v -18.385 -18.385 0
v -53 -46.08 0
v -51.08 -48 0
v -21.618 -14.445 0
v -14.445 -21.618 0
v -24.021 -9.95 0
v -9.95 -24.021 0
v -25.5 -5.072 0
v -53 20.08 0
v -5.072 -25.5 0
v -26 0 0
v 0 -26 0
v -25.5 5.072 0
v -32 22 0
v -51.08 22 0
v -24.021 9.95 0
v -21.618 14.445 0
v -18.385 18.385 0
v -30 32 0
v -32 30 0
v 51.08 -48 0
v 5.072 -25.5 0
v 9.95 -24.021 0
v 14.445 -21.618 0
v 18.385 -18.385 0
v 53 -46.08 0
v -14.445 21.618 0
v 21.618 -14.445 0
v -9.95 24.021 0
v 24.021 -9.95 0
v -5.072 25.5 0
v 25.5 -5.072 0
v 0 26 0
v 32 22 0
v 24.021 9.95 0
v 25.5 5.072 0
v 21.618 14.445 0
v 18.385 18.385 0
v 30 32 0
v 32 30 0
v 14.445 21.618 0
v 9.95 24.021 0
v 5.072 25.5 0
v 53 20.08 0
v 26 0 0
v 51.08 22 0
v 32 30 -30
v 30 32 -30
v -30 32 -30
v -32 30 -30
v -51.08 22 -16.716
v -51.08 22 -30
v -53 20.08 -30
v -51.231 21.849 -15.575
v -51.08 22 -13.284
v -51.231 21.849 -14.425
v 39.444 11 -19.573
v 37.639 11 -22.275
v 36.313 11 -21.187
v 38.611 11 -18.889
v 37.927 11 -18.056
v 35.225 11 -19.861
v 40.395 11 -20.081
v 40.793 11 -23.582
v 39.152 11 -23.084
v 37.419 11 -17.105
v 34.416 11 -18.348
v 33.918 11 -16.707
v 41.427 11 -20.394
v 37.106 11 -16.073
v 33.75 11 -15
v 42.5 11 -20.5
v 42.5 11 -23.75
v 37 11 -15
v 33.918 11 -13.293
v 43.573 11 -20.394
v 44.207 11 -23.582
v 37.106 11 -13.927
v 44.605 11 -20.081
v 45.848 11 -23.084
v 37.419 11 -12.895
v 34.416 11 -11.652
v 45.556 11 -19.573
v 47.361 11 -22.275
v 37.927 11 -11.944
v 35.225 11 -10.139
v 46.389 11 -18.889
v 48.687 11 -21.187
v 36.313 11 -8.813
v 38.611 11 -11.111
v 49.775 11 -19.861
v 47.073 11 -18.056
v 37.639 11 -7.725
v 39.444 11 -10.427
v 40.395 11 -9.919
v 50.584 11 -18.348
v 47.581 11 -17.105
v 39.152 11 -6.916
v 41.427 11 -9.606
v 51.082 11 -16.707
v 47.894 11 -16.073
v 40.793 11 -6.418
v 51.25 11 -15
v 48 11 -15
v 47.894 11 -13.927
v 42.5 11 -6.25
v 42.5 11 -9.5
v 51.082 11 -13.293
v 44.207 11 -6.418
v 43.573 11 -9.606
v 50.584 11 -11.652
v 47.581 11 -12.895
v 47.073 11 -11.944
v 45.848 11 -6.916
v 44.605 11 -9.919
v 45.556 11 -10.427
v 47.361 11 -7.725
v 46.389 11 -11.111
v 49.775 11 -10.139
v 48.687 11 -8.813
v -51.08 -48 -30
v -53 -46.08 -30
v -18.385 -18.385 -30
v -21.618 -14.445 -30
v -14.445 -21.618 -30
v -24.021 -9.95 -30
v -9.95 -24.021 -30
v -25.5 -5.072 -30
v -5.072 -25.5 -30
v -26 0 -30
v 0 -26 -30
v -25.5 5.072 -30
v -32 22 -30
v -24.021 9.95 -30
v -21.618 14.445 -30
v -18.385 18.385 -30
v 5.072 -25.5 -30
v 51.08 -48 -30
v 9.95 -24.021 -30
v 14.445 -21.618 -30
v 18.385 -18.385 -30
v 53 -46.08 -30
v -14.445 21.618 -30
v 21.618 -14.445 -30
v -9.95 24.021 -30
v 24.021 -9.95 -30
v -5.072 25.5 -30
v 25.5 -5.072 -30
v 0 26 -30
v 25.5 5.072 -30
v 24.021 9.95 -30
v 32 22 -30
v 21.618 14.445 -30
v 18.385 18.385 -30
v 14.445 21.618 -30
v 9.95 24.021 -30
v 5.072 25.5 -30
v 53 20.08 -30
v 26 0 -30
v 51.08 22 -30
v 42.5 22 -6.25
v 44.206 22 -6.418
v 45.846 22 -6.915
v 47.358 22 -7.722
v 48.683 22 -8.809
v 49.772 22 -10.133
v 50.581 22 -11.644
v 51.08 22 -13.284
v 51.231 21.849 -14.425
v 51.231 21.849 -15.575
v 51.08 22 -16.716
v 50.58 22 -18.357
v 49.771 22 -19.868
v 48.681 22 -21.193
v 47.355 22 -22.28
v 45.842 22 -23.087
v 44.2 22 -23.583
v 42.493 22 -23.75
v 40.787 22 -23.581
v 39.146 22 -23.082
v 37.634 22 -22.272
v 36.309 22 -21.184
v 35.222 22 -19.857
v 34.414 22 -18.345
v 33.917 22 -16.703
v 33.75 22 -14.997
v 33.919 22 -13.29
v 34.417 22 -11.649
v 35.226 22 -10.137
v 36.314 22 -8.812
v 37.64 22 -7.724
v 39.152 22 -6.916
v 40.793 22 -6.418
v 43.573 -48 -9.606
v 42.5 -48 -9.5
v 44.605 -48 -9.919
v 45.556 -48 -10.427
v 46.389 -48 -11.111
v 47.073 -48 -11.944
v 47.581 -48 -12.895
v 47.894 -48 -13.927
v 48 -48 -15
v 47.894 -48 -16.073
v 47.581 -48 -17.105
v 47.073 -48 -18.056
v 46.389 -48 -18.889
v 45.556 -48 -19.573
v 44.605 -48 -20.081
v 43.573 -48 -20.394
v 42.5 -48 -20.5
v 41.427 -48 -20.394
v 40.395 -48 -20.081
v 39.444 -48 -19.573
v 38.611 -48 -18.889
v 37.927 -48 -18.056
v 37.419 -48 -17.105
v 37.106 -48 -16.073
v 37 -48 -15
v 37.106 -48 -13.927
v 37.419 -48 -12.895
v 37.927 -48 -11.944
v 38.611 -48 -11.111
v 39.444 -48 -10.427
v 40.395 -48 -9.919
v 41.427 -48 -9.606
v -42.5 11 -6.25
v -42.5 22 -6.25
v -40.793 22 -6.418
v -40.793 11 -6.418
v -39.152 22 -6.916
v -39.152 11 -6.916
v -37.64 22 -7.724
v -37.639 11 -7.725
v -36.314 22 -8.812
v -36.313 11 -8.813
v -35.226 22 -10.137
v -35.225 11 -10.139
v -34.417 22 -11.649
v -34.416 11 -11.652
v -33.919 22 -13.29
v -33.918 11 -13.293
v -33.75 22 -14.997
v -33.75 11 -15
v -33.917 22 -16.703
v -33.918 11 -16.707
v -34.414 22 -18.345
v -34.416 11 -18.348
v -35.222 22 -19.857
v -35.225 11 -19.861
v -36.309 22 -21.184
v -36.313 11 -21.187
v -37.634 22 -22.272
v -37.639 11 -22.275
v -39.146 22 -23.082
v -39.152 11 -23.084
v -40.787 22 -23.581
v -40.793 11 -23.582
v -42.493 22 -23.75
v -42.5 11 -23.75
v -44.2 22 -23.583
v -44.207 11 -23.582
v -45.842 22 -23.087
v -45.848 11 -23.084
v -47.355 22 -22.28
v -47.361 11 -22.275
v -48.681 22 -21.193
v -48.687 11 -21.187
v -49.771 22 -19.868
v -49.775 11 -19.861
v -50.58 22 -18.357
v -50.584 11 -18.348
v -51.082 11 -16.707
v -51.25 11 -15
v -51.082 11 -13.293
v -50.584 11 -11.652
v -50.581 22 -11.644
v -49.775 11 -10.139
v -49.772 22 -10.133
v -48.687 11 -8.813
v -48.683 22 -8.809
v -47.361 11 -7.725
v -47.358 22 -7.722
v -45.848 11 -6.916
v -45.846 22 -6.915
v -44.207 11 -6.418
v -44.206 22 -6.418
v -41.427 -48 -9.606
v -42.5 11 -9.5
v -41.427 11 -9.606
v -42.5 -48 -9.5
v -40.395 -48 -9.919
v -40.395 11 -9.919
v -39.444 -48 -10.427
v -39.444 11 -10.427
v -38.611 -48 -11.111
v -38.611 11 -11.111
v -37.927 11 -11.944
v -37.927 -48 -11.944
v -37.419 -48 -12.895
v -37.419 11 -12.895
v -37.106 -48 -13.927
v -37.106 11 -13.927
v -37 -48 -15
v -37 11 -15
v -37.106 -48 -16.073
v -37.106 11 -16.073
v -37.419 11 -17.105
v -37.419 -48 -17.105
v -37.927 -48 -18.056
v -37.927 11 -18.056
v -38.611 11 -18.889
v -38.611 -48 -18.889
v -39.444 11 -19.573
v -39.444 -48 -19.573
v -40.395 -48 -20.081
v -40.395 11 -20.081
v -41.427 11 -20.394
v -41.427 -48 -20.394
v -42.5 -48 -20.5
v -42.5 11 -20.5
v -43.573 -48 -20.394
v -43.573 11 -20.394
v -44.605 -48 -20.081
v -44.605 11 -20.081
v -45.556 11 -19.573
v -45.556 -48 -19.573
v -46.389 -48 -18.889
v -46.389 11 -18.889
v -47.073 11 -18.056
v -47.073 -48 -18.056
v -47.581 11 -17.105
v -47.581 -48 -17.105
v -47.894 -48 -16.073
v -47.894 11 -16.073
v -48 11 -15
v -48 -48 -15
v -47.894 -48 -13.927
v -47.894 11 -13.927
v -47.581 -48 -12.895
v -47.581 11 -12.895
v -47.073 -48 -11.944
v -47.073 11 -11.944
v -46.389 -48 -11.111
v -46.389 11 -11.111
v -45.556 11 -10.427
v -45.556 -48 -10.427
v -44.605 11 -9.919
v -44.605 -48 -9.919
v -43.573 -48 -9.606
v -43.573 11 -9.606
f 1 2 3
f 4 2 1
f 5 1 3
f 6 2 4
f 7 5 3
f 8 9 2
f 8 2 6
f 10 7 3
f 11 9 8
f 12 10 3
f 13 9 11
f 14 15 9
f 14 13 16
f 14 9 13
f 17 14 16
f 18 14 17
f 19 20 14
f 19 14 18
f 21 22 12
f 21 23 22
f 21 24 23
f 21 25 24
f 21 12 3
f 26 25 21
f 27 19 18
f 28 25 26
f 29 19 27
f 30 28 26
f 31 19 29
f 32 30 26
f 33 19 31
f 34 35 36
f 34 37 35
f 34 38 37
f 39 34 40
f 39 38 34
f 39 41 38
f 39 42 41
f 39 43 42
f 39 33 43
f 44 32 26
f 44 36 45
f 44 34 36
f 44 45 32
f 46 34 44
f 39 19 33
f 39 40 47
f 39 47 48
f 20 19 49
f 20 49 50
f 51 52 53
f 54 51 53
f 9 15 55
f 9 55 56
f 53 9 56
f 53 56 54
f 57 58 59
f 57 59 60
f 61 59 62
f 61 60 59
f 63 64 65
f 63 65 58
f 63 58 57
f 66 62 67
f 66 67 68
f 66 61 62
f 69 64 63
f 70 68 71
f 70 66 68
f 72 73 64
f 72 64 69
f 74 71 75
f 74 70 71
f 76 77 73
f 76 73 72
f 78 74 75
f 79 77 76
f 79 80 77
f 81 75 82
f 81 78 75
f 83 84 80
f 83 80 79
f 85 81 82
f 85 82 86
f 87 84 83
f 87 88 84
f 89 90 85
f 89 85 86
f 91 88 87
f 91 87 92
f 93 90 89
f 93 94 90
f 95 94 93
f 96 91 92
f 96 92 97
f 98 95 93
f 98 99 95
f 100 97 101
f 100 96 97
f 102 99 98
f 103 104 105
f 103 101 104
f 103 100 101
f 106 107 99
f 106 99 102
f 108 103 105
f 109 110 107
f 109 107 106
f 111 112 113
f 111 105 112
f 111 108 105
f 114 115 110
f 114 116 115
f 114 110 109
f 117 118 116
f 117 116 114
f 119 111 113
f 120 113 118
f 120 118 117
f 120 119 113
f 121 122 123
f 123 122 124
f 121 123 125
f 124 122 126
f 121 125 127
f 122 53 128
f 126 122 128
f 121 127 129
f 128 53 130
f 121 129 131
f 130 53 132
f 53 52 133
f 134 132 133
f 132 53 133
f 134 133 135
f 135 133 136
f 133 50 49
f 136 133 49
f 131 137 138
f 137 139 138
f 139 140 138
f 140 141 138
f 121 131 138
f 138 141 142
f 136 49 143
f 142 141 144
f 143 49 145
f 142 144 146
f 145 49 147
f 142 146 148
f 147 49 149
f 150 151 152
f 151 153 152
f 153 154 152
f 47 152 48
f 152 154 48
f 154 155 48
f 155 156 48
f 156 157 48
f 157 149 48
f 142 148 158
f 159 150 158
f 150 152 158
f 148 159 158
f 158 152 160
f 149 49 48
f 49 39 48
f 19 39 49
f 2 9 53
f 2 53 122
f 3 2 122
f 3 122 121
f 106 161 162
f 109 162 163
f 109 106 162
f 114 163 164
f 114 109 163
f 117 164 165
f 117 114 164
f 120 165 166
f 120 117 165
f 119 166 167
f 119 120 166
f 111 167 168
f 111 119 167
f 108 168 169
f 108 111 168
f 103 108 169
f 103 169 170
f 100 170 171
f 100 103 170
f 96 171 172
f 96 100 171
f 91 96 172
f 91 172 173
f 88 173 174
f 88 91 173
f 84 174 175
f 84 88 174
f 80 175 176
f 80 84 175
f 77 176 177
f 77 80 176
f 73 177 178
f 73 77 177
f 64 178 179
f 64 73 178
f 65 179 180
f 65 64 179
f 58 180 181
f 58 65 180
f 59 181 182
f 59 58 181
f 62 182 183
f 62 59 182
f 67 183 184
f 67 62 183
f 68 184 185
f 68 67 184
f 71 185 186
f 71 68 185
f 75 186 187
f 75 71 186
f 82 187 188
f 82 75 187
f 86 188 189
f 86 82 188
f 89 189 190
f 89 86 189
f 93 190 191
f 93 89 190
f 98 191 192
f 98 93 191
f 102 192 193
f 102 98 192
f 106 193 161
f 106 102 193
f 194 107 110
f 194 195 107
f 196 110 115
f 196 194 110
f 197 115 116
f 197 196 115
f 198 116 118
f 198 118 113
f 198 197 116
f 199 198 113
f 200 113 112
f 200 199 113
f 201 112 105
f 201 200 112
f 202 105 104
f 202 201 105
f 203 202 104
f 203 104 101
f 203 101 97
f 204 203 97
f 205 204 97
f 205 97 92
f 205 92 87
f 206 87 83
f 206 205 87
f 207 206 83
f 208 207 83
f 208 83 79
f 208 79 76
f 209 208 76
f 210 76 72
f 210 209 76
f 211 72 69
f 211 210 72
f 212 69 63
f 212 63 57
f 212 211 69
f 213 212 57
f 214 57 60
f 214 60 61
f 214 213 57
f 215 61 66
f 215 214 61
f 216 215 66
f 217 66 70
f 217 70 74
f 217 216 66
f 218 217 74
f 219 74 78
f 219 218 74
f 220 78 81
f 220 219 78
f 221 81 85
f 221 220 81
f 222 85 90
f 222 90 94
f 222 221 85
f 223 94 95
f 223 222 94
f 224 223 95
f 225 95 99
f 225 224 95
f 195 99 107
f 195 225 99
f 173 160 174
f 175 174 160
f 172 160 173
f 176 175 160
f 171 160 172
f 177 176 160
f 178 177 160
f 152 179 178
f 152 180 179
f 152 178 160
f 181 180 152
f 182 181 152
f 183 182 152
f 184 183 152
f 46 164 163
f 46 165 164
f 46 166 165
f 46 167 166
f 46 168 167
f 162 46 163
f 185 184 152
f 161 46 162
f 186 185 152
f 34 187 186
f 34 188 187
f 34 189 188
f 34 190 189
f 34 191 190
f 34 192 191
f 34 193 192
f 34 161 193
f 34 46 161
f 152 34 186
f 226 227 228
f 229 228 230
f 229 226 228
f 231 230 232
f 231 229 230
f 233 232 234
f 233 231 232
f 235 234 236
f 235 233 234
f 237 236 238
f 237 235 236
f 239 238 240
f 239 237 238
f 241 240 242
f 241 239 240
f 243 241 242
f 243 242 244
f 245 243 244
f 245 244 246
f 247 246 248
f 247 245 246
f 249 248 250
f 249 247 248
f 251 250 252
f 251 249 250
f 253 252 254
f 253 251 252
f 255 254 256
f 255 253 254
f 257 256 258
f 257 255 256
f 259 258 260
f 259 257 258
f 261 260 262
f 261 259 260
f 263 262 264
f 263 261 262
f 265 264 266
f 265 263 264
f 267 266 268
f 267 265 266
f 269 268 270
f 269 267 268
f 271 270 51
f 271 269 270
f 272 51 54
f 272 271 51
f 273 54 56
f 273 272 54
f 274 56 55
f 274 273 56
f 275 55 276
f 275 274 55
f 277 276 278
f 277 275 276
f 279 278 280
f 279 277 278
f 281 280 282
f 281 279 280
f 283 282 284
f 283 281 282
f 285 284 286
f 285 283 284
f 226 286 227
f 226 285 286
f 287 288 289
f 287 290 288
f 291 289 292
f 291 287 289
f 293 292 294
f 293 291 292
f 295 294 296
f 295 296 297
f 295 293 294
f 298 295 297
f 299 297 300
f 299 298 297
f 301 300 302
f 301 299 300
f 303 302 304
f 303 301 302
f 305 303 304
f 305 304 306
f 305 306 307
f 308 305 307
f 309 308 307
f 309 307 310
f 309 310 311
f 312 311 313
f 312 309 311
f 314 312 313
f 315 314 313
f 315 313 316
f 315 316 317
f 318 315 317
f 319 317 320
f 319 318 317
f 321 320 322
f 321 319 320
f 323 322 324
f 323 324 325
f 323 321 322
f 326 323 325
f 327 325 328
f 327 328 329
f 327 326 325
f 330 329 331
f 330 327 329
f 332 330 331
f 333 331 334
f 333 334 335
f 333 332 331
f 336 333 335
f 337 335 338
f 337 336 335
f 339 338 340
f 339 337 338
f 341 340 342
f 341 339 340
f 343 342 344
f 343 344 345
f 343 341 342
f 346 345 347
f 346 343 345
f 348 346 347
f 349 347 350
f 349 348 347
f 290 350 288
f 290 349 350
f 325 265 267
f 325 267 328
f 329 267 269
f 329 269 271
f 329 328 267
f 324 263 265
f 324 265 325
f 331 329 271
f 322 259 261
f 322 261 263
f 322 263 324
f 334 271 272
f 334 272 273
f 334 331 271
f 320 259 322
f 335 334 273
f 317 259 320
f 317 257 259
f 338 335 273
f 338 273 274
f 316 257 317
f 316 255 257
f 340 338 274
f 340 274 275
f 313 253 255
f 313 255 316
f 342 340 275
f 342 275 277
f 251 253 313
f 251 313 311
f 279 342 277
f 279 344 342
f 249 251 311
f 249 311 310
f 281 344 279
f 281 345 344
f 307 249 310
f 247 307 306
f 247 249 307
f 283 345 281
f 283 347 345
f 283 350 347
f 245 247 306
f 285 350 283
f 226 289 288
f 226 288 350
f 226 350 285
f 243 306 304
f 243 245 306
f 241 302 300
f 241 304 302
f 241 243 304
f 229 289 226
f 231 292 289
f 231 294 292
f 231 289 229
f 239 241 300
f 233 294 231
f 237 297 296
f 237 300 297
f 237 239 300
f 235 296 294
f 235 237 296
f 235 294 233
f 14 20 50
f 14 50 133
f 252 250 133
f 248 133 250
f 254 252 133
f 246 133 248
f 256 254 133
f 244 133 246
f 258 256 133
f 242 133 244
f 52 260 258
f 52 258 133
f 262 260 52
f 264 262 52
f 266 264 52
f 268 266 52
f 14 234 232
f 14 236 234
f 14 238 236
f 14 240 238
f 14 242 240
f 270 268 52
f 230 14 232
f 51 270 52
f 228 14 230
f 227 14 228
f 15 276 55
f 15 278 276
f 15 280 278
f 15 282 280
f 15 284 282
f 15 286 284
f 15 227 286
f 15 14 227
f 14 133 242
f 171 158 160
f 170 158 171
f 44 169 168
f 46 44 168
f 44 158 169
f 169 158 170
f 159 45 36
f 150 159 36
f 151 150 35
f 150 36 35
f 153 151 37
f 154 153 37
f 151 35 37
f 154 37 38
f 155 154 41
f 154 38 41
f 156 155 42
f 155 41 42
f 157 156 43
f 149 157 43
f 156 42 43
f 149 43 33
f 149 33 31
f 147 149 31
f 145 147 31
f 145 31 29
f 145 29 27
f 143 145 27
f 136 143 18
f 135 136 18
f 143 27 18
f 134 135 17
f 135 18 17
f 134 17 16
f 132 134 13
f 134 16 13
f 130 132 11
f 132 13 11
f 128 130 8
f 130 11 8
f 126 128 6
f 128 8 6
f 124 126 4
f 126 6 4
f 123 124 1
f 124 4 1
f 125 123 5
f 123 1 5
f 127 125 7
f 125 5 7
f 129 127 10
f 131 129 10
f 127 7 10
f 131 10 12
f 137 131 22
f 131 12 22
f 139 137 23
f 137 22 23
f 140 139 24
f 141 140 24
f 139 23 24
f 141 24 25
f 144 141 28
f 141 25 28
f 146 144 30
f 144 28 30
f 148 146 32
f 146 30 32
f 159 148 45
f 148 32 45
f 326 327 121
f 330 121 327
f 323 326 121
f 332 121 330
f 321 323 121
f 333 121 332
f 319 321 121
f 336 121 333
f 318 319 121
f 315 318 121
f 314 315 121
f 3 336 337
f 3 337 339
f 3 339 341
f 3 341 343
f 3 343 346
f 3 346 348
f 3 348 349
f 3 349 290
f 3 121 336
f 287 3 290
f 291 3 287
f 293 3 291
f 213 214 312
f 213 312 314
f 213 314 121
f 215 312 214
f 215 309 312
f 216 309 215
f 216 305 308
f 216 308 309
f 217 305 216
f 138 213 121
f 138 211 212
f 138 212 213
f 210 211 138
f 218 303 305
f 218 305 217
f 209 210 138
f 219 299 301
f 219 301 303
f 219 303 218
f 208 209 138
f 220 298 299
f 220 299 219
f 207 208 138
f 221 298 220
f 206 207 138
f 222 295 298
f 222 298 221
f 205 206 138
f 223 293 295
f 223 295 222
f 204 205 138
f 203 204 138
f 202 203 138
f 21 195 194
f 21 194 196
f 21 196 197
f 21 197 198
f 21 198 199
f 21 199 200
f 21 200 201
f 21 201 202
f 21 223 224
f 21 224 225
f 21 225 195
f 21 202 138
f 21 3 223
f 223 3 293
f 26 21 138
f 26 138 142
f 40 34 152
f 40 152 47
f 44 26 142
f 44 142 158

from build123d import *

# Parameters (mm, degrees)
BOSS_EXTRUDE1_DEPTH = 30
SKETCH4_R           = 26
CUT_EXTRUDE1_DEPTH  = 30


with BuildPart() as part:
    # Sketch1 → Boss-Extrude1 (new body)
    with BuildSketch(Plane.XY):
        Polygon((-53, -46.08), (-51.08, -48), (51.08, -48), (53, -46.08), (53, 20.08), (51.08, 22), (32, 22), (32, 30), (30, 32), (-30, 32), (-32, 30), (-32, 22), (-51.08, 22), (-53, 20.08), align=None)
    extrude(amount=-BOSS_EXTRUDE1_DEPTH)

    # Sketch2 → Cut-Revolve1 (revolve, cut)
    with BuildSketch(Plane(origin=(42.5, 0, 0), x_dir=(0, 0, -1), z_dir=(1, 0, 0)), mode=Mode.PRIVATE) as cut_revolve1_sk:
        Polygon((15, 22), (23.75, 22), (23.75, 11), (20.5, 11), (20.5, -48), (15, -48), align=None)
    revolve(cut_revolve1_sk.sketch.rotate(Axis((42.5, -48, -15), (0, 1, 0)), 180), axis=Axis((42.5, -48, -15), (0, 1, 0)), mode=Mode.SUBTRACT)

    # Sketch3 → Cut-Revolve2 (revolve, cut)
    with BuildSketch(Plane(origin=(-42.5, 0, 0), x_dir=(0, 0, -1), z_dir=(1, 0, 0)), mode=Mode.PRIVATE) as cut_revolve2_sk:
        Polygon((15, 22), (23.75, 22), (23.75, 11), (20.5, 11), (20.5, -48), (15, -48), align=None)
    revolve(cut_revolve2_sk.sketch.rotate(Axis((-42.5, -48, -15), (0, 1, 0)), 180), axis=Axis((-42.5, -48, -15), (0, 1, 0)), mode=Mode.SUBTRACT)

    # Sketch4 → Cut-Extrude1 (cut)
    with BuildSketch(Plane.XY):
        Circle(SKETCH4_R)
    extrude(amount=-CUT_EXTRUDE1_DEPTH, mode=Mode.SUBTRACT)


solid = part.part
